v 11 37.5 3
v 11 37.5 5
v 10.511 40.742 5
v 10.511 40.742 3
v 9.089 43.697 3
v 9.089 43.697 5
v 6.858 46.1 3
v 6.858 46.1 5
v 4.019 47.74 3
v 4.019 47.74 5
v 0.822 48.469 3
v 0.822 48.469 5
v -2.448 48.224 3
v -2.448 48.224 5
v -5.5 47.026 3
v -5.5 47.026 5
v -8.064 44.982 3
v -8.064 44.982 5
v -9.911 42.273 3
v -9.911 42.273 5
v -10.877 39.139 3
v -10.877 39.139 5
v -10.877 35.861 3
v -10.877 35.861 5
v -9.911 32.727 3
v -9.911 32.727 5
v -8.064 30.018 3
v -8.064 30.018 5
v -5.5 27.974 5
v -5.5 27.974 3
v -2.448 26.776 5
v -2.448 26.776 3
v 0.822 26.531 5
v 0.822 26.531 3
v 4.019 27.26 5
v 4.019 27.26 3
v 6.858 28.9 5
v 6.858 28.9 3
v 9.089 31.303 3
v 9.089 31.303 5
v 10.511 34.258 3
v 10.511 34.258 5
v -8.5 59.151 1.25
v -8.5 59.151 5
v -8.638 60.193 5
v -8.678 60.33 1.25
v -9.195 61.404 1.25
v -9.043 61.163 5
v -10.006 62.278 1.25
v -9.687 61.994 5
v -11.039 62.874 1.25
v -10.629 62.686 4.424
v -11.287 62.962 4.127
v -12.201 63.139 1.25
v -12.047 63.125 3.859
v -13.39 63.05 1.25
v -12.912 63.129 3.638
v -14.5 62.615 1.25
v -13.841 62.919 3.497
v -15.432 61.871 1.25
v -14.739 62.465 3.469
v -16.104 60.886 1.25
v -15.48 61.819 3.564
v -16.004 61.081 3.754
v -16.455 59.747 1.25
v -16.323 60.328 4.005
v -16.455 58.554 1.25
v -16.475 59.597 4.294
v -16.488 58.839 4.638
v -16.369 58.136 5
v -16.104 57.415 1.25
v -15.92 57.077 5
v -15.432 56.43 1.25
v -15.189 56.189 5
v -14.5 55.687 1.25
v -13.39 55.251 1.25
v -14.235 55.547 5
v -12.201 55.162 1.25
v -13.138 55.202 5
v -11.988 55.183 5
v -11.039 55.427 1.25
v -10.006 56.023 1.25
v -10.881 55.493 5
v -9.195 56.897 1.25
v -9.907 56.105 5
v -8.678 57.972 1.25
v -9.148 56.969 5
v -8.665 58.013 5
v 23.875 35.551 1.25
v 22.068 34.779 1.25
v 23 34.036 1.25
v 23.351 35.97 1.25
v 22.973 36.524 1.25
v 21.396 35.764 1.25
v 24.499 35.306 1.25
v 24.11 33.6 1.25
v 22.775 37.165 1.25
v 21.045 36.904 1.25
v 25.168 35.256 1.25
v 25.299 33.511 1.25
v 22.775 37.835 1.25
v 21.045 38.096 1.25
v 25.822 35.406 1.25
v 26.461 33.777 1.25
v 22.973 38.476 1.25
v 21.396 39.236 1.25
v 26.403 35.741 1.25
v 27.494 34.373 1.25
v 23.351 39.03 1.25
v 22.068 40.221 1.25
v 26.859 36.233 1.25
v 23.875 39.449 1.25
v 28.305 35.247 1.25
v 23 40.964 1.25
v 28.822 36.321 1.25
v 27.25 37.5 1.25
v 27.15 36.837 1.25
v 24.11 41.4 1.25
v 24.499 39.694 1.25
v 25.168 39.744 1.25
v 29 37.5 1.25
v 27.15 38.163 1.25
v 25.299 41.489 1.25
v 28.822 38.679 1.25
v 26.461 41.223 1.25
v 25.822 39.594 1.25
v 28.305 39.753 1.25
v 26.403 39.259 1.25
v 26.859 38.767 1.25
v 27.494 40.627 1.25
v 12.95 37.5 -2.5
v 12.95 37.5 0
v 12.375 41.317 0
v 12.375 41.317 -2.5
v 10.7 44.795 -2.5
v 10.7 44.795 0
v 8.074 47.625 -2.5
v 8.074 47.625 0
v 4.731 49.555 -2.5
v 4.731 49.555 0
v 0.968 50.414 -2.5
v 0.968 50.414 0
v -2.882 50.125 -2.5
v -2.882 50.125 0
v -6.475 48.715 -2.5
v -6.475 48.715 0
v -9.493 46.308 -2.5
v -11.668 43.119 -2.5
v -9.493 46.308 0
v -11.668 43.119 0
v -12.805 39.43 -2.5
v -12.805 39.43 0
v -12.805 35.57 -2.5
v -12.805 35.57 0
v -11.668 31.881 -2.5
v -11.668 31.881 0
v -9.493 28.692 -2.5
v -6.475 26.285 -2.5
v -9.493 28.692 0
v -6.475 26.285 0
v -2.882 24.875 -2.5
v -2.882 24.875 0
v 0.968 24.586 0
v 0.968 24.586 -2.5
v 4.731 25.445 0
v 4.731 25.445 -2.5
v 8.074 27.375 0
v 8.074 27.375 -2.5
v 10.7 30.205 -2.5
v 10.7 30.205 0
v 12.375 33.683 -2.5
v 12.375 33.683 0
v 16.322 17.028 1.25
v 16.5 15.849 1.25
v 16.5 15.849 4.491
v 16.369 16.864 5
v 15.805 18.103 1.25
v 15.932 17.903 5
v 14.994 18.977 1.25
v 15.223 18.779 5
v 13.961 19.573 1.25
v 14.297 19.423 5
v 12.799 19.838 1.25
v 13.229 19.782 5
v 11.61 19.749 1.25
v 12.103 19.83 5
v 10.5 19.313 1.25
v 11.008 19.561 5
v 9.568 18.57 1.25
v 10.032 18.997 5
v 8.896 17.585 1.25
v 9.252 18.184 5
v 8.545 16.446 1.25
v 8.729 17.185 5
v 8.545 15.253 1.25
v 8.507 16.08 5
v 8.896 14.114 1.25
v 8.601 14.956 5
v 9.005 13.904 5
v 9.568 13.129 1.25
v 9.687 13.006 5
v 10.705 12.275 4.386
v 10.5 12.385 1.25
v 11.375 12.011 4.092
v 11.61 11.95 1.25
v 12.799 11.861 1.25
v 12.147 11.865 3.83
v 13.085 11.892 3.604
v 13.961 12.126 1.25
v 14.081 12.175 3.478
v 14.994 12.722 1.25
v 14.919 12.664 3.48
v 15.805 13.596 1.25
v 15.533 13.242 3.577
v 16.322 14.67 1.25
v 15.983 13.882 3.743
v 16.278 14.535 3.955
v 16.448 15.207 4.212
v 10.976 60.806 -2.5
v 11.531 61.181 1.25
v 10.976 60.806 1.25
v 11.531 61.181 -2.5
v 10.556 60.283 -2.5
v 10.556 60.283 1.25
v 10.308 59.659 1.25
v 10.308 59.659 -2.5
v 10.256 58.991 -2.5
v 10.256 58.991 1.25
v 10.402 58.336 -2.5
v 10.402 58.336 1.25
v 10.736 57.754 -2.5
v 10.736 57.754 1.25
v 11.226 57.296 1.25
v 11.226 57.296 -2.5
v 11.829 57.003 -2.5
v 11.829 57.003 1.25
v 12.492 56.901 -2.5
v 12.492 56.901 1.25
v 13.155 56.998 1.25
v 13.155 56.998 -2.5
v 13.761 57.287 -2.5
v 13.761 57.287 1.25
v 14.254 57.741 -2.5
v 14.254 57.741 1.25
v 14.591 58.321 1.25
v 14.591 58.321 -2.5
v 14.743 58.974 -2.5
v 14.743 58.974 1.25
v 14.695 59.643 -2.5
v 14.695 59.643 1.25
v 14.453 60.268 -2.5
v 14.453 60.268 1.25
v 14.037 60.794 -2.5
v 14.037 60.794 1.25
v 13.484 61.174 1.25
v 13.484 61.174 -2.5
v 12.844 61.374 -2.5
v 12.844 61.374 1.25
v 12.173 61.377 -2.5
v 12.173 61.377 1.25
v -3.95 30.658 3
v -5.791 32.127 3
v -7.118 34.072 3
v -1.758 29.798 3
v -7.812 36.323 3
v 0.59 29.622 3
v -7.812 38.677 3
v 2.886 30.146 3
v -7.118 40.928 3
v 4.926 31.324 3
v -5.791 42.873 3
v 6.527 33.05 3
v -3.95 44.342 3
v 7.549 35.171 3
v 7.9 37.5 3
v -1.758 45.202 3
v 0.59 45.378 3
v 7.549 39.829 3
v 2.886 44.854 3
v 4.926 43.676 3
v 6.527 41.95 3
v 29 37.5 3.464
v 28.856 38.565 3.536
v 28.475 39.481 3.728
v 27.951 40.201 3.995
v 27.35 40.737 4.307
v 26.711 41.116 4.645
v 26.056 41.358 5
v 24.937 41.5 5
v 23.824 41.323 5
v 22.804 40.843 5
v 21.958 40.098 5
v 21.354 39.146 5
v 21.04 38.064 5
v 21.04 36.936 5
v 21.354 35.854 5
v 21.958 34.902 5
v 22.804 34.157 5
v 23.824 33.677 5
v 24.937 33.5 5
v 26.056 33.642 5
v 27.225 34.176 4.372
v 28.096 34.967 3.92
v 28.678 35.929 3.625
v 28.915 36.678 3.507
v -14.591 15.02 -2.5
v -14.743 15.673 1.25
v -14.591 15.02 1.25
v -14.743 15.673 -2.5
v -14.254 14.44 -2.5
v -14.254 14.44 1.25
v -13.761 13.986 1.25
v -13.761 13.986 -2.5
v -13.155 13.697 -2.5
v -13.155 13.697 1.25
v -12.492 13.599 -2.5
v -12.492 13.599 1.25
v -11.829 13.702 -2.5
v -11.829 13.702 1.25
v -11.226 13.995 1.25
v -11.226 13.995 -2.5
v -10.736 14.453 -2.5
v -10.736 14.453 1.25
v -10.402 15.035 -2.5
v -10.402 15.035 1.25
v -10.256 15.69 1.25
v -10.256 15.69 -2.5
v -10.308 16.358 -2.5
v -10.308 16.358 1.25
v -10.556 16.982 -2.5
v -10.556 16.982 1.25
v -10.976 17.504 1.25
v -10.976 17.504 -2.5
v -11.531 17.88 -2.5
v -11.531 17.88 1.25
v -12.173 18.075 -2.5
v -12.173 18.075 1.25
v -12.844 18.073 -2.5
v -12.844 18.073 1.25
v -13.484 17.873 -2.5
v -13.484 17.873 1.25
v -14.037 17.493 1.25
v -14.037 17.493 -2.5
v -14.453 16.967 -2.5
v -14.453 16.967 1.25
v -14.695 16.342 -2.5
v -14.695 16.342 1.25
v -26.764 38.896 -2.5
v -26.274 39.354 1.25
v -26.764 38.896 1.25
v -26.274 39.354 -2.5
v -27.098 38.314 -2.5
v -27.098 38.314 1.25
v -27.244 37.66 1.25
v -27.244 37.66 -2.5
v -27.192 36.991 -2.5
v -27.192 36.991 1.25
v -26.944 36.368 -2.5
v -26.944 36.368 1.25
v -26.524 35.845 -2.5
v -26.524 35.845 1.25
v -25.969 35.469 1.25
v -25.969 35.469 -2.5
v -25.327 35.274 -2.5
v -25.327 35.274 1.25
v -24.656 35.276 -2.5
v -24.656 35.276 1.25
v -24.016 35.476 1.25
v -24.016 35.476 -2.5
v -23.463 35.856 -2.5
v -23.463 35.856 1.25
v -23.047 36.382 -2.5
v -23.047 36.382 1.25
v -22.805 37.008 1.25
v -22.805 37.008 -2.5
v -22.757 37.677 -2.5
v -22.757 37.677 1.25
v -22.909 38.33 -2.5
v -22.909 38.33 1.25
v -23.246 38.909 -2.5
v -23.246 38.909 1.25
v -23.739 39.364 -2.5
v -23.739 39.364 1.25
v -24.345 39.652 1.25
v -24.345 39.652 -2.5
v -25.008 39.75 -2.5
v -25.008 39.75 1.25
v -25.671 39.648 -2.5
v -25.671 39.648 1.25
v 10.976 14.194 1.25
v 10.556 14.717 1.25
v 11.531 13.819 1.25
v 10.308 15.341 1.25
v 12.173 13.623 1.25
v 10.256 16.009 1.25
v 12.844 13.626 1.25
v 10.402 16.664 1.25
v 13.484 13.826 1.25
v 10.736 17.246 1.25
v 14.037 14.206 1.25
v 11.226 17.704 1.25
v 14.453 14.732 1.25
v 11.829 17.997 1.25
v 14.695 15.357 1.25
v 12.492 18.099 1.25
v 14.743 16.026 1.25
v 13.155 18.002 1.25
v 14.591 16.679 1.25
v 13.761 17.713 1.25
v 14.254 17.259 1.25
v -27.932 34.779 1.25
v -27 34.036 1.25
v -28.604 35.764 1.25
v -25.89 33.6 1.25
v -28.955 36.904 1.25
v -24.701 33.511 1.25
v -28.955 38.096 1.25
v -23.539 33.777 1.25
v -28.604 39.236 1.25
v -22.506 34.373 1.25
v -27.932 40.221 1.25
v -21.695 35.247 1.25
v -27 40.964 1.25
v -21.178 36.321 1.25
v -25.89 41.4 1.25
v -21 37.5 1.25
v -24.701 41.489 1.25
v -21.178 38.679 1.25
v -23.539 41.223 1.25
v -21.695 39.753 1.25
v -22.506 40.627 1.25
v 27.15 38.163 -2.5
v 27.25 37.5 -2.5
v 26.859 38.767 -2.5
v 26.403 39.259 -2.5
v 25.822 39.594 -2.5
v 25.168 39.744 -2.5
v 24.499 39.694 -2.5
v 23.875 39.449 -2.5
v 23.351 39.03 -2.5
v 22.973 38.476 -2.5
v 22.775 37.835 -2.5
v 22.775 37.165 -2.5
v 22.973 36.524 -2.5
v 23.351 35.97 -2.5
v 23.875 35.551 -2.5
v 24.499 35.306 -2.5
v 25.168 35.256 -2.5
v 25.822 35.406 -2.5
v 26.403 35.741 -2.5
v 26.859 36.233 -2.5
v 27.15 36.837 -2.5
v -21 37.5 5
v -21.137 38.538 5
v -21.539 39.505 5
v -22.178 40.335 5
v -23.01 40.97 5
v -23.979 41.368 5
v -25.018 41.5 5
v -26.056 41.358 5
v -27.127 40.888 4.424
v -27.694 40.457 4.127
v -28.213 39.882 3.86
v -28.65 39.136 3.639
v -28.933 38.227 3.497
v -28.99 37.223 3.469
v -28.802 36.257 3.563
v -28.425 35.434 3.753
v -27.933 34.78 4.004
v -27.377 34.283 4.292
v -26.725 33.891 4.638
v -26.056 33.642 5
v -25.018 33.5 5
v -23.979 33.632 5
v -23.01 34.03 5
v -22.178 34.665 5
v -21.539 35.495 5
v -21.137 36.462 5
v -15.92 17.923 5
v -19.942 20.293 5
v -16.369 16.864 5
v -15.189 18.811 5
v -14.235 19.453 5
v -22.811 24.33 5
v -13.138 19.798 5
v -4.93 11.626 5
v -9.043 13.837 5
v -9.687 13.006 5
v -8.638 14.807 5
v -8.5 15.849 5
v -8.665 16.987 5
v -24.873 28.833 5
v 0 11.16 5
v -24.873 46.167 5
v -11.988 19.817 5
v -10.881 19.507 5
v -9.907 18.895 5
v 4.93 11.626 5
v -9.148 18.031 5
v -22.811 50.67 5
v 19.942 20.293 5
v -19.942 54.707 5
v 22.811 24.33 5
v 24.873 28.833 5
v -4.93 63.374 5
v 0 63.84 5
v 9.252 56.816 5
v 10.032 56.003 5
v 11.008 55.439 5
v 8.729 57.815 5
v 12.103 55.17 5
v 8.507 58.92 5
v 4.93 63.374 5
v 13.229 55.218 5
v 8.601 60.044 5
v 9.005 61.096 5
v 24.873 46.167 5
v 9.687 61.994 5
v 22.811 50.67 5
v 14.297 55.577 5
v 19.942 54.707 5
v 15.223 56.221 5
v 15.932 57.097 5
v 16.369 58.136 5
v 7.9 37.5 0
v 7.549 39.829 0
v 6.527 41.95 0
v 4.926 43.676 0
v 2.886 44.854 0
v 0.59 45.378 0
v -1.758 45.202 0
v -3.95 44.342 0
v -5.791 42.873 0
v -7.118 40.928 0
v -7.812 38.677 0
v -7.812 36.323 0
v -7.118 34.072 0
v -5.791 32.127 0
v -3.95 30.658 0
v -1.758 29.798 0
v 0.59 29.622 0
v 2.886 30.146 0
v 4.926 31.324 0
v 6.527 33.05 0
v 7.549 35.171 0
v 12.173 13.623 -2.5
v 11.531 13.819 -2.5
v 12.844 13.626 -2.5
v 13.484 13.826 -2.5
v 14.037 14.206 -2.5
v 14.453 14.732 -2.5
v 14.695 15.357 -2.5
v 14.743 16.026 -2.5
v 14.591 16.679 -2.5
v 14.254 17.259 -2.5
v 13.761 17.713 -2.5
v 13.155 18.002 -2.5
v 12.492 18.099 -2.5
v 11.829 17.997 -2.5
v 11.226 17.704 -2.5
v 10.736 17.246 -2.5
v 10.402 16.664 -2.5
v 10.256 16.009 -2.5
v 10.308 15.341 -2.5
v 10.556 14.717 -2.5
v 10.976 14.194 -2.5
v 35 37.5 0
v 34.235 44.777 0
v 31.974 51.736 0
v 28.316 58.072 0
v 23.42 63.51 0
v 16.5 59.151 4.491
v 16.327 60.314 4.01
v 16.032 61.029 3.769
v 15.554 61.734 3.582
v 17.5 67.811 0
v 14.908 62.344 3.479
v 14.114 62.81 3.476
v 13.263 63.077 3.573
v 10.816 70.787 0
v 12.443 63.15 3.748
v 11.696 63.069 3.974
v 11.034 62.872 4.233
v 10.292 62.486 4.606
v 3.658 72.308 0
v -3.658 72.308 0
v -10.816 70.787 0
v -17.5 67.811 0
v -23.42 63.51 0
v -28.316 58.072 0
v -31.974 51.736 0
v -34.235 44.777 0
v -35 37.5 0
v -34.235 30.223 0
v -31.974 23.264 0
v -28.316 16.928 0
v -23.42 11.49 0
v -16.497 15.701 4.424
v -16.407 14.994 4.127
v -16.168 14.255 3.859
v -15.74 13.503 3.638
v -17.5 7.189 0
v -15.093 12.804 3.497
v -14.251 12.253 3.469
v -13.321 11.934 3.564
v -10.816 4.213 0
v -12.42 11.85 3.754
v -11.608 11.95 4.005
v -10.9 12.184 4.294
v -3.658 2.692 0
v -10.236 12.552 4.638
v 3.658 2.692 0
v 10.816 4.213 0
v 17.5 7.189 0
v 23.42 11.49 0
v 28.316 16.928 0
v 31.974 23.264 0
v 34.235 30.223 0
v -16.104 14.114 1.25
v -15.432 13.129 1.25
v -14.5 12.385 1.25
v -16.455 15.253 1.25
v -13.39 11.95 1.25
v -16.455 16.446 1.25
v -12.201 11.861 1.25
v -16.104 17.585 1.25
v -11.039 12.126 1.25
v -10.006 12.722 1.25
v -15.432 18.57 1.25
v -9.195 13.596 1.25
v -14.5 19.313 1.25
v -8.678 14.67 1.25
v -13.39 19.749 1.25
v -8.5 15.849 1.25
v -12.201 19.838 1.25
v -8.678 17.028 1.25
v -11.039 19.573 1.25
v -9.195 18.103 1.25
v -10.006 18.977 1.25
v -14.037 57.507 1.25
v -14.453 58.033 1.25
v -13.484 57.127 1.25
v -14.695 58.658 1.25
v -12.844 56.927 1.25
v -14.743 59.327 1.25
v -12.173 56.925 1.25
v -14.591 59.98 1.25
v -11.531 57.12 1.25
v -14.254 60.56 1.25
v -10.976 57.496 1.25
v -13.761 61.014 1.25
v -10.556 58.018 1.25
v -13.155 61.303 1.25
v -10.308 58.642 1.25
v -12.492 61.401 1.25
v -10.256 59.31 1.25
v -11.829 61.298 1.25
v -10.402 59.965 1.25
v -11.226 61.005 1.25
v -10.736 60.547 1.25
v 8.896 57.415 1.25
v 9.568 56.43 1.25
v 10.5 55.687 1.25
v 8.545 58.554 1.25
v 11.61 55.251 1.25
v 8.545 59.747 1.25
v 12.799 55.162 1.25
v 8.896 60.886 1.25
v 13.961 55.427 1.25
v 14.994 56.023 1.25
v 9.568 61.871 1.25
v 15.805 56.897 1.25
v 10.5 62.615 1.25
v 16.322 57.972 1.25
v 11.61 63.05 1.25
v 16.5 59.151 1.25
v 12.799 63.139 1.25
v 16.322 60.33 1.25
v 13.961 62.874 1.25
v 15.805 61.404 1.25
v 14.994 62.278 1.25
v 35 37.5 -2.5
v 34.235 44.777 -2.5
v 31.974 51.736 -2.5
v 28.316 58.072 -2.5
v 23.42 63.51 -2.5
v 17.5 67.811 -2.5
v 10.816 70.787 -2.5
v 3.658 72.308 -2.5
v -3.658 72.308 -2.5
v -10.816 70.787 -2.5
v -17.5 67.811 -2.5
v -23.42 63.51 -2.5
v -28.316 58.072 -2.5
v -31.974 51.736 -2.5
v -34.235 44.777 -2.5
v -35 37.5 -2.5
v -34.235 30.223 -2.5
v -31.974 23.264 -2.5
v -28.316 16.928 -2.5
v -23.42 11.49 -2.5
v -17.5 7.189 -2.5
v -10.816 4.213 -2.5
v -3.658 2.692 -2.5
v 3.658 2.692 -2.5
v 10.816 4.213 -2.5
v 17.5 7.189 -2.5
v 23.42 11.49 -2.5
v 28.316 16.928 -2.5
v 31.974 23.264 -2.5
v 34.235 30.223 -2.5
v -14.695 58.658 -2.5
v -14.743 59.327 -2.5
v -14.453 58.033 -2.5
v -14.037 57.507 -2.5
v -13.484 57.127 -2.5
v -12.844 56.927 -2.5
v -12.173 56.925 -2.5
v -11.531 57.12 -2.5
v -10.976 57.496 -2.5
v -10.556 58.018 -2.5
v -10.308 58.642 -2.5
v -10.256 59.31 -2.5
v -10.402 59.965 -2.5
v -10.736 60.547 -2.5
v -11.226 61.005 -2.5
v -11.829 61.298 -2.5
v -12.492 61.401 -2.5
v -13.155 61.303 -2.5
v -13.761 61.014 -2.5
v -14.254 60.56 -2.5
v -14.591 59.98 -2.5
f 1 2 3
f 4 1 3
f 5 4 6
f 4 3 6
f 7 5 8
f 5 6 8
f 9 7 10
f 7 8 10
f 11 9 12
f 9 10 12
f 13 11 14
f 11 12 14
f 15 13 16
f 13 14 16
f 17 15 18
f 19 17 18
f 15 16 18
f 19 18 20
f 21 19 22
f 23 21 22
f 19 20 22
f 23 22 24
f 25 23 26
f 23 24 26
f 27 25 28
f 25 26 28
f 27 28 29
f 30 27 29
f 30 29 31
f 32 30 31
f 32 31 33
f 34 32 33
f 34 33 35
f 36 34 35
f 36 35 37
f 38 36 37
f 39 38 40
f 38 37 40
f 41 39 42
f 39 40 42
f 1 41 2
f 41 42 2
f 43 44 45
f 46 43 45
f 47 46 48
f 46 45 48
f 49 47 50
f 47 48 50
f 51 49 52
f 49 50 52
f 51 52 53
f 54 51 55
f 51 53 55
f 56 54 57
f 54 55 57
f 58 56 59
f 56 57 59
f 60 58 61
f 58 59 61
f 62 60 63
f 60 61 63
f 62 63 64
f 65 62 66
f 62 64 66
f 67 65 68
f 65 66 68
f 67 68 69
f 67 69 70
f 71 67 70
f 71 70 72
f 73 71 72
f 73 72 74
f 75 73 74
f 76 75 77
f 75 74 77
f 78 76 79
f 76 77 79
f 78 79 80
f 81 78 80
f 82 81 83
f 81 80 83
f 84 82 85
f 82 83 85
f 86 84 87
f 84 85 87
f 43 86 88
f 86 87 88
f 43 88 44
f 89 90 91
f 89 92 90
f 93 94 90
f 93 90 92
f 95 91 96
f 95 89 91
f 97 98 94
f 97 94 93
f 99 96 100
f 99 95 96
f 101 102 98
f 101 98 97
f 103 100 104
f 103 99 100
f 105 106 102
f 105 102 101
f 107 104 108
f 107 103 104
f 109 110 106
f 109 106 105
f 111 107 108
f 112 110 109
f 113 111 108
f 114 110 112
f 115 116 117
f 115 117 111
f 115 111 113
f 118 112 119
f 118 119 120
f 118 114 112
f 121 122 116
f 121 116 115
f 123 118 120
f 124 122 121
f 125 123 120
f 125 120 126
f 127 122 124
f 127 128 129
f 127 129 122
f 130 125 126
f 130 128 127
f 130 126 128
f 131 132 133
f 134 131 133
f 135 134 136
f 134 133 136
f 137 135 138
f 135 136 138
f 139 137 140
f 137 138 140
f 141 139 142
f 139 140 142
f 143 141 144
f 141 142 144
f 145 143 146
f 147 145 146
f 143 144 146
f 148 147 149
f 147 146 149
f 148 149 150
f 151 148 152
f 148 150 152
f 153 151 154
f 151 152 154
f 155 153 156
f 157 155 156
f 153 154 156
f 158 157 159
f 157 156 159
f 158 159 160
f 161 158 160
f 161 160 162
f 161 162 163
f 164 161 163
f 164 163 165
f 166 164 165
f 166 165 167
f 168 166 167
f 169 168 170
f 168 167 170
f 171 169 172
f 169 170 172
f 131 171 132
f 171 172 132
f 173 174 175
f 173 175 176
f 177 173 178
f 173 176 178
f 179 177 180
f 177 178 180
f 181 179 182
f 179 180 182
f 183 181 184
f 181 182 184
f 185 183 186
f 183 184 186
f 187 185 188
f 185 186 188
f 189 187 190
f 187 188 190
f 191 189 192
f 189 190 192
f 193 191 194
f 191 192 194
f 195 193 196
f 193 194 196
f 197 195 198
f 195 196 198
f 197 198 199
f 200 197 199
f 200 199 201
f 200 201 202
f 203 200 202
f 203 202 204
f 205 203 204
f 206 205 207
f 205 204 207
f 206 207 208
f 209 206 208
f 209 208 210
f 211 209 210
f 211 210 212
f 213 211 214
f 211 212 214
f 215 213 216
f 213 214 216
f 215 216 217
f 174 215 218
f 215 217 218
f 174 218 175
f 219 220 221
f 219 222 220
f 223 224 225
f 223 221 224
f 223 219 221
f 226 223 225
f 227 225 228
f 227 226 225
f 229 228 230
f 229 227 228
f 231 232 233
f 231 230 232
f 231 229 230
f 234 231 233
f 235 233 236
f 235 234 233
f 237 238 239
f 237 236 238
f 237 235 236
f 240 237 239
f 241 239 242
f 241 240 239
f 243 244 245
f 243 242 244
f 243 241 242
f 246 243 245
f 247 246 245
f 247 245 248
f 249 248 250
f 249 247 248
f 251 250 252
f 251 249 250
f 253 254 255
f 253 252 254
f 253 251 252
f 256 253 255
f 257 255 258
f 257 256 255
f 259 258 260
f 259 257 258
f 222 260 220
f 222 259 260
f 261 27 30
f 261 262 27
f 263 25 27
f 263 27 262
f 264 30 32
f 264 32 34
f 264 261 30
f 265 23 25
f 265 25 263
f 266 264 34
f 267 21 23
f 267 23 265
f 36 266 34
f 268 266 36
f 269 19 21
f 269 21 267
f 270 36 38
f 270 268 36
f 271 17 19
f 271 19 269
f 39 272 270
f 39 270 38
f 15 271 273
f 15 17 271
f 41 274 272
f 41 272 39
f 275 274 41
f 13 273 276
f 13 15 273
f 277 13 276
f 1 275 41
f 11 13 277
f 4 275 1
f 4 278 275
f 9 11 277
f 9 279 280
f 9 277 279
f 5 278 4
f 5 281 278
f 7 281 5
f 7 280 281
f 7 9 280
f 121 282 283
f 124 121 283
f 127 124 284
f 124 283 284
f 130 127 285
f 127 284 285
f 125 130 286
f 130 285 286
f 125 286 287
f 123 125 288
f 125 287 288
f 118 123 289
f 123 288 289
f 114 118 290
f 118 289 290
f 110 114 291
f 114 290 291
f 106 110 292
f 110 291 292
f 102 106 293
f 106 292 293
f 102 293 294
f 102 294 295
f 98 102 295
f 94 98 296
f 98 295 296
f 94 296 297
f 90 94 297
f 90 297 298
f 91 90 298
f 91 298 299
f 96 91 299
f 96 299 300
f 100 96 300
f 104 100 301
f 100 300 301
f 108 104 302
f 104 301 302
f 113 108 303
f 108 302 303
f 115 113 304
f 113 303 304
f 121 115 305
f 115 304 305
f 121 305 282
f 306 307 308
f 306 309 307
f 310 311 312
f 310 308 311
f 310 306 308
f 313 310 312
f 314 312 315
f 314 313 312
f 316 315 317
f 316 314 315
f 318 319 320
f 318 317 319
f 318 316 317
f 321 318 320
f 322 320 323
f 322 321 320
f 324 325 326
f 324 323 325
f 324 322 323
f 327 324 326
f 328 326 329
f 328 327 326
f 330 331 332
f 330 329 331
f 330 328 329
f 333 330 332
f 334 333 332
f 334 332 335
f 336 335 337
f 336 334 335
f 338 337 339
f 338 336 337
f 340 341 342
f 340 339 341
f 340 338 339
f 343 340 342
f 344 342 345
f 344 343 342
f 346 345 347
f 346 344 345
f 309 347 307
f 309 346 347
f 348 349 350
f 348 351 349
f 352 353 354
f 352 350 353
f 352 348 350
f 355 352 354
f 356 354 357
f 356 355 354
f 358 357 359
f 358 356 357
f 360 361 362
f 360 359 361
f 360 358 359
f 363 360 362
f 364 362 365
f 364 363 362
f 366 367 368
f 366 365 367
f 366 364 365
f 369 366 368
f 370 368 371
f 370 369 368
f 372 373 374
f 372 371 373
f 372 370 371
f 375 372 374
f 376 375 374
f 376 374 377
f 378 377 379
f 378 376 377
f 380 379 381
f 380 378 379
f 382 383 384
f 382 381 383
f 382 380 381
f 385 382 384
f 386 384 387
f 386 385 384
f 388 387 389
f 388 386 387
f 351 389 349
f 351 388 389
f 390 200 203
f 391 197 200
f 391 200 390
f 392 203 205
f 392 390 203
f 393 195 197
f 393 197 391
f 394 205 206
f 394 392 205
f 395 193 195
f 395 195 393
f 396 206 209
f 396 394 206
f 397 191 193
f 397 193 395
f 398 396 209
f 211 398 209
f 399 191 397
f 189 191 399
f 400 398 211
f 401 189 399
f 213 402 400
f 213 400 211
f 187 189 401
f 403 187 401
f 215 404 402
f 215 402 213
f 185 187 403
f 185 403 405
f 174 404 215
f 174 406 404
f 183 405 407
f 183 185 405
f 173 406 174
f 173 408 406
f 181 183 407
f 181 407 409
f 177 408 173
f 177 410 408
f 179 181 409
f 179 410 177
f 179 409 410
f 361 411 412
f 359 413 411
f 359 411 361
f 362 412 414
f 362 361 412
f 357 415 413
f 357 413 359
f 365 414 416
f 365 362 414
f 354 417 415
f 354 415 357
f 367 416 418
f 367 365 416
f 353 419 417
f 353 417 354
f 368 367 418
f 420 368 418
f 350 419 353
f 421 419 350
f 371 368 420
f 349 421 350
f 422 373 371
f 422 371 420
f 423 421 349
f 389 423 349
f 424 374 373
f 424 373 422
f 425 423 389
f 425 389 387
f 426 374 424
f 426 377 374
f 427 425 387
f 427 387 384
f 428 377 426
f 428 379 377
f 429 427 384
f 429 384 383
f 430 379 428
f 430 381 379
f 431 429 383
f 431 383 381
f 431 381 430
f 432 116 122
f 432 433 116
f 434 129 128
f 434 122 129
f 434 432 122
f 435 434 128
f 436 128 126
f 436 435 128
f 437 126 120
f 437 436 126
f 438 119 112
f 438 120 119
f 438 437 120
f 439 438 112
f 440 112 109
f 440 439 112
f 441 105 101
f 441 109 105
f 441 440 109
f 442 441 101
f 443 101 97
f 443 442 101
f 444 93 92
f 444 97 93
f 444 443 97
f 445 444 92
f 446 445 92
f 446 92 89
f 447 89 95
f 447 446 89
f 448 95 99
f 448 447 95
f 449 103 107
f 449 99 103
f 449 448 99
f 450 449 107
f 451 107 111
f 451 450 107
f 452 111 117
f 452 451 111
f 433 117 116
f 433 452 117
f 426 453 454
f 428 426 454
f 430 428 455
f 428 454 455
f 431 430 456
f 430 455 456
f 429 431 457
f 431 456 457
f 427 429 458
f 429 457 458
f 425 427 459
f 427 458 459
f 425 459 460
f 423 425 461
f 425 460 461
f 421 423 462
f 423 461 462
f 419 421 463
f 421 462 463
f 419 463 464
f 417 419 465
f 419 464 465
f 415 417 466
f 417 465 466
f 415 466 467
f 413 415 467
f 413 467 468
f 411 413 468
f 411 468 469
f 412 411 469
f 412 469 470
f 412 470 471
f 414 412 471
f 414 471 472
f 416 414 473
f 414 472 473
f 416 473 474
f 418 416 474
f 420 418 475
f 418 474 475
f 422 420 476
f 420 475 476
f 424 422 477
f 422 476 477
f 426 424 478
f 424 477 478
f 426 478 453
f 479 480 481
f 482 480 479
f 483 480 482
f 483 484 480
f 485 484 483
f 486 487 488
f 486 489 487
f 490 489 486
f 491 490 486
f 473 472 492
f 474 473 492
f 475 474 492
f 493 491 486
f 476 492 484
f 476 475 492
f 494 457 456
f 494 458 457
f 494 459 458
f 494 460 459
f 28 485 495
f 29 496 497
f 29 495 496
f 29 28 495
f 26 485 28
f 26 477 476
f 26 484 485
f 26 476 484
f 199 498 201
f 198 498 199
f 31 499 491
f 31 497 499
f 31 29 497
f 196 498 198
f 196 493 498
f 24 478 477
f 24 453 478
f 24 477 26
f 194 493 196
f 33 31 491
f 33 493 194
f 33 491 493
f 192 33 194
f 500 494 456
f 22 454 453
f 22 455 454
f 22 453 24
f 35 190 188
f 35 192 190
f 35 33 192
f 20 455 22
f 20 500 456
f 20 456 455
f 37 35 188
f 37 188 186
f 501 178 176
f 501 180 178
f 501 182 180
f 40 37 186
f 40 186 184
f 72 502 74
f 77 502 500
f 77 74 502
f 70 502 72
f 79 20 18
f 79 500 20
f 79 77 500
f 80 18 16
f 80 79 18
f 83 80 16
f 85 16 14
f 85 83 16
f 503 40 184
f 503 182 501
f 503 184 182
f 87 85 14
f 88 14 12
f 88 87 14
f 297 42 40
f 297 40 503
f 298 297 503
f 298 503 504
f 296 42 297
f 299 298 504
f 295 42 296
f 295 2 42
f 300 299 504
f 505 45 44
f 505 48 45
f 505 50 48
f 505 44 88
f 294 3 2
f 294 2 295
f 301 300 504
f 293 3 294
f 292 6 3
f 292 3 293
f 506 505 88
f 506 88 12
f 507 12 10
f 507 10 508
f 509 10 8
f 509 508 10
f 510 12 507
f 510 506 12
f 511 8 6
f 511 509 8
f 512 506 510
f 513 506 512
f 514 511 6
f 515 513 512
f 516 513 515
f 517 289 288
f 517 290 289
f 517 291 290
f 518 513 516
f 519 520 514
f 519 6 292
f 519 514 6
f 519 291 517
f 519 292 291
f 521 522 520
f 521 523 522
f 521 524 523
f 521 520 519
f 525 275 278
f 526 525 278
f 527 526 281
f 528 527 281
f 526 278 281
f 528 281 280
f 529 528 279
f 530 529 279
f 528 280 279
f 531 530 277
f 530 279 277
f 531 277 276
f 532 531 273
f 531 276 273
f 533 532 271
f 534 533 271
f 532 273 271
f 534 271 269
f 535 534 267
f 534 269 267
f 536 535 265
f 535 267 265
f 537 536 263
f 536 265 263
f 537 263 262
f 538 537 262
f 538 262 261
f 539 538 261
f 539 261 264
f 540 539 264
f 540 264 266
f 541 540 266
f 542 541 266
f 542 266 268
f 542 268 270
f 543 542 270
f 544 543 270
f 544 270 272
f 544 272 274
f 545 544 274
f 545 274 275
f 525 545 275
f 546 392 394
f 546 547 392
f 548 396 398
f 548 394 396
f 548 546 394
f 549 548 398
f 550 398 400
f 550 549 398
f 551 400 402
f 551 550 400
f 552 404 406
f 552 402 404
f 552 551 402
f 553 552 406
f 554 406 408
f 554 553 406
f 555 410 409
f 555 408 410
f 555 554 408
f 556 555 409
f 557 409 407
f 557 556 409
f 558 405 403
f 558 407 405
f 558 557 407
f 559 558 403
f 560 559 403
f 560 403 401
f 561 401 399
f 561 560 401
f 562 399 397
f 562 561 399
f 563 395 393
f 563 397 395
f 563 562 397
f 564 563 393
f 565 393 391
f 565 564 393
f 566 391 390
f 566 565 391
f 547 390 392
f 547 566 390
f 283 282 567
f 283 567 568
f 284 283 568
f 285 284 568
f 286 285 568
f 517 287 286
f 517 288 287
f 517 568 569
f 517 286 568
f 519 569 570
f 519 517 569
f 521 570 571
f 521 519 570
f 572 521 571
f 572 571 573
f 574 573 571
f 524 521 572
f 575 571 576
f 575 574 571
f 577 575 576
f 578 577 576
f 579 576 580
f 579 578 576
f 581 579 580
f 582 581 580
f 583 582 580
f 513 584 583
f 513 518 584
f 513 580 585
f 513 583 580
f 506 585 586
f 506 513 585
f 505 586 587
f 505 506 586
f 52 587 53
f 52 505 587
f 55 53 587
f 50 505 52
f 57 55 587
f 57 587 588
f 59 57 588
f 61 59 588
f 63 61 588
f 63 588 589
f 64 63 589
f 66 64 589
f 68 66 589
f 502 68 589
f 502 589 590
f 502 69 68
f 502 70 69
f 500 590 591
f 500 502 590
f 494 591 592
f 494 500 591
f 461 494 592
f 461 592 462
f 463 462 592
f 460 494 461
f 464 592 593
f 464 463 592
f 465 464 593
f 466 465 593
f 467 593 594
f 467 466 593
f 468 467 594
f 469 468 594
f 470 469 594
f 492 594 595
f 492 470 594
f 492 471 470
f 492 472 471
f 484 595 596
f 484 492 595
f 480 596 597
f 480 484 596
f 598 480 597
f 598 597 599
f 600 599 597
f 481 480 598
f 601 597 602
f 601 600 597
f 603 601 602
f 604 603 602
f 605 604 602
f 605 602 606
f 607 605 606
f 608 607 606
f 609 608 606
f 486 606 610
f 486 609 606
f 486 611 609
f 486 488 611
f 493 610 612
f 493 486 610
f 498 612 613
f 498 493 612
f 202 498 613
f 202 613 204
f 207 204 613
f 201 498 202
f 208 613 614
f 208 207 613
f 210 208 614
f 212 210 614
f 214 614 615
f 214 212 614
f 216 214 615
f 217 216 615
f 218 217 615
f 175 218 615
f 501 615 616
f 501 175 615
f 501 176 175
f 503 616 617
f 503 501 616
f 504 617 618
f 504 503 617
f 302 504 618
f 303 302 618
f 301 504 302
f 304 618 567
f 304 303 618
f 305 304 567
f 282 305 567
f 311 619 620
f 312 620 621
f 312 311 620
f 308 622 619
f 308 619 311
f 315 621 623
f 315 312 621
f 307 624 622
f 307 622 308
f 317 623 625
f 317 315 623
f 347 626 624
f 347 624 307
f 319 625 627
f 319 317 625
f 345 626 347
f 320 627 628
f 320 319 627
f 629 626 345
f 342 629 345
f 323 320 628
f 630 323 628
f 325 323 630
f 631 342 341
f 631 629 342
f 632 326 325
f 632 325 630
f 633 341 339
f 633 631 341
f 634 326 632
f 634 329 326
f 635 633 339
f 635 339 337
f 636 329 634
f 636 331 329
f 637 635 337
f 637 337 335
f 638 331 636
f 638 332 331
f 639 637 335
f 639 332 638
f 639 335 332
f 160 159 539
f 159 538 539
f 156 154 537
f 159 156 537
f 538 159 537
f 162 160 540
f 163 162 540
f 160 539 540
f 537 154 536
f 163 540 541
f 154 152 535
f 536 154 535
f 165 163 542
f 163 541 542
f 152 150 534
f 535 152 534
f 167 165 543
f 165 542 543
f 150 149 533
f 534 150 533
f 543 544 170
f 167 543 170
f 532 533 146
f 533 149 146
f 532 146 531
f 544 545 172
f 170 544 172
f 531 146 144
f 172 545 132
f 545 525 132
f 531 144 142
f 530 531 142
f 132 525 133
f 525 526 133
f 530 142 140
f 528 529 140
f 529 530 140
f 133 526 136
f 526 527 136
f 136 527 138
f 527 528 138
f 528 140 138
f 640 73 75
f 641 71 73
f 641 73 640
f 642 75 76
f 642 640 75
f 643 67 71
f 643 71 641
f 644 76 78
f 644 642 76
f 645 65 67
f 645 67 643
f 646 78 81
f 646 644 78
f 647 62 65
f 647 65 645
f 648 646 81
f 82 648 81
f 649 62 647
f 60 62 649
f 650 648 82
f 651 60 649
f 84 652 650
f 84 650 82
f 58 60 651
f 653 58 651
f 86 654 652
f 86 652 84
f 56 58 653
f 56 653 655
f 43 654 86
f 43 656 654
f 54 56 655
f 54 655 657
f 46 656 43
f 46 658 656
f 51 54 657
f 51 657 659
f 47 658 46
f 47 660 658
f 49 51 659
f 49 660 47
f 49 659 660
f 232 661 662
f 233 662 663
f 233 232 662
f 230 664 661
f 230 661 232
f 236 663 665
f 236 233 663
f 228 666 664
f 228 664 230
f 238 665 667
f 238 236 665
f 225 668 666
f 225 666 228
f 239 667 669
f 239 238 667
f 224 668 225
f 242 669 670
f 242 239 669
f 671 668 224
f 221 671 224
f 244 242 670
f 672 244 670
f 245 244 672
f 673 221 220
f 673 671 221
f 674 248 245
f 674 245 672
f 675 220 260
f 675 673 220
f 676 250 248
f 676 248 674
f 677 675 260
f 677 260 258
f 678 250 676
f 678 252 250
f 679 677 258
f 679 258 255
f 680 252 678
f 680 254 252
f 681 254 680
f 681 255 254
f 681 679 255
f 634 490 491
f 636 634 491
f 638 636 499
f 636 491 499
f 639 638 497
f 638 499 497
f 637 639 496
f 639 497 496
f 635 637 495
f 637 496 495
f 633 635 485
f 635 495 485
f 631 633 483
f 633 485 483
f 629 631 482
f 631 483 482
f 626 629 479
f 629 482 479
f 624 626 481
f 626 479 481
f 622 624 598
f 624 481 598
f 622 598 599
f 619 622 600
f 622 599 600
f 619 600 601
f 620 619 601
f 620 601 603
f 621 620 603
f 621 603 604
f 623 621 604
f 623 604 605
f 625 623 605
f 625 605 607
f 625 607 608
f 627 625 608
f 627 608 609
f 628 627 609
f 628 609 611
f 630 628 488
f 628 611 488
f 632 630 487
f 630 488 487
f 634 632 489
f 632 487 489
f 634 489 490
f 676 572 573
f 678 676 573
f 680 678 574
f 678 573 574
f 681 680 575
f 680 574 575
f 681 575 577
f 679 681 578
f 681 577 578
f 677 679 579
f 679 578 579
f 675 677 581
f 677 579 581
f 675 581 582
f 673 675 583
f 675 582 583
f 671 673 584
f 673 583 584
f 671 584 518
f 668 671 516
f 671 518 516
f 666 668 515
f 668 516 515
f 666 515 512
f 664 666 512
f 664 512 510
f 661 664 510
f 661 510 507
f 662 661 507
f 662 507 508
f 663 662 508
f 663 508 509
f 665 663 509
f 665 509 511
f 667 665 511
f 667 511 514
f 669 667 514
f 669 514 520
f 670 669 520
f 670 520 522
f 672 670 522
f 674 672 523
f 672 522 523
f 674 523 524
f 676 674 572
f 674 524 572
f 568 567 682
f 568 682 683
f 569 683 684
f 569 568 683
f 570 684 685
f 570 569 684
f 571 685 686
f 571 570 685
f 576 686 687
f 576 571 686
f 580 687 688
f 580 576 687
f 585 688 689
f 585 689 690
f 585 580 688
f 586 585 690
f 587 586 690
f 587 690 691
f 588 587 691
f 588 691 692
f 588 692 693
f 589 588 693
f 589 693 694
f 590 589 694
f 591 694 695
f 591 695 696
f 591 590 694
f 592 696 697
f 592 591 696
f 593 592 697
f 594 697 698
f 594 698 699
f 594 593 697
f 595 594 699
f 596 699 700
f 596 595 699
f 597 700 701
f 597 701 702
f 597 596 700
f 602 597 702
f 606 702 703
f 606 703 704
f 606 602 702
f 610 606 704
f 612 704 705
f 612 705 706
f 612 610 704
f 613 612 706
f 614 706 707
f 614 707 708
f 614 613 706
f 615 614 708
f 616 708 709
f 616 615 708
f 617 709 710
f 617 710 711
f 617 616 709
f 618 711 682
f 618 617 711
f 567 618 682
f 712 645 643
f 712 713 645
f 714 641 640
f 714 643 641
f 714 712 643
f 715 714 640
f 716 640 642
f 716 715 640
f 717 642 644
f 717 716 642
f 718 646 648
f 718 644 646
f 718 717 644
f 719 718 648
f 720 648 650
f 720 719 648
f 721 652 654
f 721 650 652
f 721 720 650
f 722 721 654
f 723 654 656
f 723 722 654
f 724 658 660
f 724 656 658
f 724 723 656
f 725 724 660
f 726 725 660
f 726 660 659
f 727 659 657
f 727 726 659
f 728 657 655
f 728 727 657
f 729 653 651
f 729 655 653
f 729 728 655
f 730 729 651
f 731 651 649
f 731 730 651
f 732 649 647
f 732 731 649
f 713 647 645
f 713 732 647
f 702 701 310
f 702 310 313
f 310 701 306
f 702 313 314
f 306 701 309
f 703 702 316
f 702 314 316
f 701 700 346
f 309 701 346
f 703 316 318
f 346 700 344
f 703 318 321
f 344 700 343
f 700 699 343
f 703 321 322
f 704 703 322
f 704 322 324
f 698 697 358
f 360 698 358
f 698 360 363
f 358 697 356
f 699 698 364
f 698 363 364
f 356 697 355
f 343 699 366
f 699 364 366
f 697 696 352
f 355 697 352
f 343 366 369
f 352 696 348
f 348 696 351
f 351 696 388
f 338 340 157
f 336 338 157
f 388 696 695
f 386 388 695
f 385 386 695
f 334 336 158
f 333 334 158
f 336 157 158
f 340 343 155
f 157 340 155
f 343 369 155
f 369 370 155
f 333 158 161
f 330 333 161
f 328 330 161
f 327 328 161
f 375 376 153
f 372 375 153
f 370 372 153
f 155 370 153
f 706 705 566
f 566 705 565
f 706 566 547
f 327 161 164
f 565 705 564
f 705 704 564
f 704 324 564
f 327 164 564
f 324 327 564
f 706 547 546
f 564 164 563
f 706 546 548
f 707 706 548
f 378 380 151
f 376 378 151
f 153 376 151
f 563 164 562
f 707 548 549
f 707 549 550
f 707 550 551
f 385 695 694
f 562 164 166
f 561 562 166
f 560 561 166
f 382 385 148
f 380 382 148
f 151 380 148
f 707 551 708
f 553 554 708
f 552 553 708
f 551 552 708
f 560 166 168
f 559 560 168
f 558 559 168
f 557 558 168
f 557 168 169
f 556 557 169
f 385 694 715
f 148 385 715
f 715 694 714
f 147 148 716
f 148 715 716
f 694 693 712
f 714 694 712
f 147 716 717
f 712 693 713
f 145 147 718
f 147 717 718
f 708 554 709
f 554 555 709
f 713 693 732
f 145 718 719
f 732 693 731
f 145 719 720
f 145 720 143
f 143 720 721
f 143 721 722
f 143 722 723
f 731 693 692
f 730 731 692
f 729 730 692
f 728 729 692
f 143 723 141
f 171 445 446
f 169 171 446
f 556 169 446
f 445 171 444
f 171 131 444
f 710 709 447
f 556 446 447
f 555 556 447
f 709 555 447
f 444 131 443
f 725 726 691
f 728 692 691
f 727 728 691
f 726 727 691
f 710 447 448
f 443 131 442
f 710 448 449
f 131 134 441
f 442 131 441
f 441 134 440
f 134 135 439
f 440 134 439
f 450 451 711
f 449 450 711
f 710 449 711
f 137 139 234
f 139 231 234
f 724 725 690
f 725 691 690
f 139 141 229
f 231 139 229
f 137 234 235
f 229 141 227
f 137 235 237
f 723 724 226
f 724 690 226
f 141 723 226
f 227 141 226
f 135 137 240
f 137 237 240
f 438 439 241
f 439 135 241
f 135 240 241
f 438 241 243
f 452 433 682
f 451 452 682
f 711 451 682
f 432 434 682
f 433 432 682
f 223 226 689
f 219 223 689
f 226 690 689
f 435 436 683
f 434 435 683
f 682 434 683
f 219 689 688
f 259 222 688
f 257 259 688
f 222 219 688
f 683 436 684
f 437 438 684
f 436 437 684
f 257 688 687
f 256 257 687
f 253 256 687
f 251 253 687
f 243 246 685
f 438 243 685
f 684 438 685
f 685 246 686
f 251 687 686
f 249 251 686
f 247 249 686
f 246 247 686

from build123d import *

# Parameters (mm, degrees)
SKETCH1_R               = 35
BOSS_EXTRUDE1_DEPTH     = 5
BOSS_EXTRUDE1_TAPER     = 60
SKETCH3_R               = 11
CUT_EXTRUDE1_DEPTH      = 2
SKETCH4_R               = 7.9
CUT_EXTRUDE2_DEPTH      = 81.661329025
SKETCH7_R               = 35
SKETCH7_R_2             = 12.95
BOSS_EXTRUDE2_DEPTH     = 2.5
CUT_EXTRUDE6_DEPTH      = 81.661329025
CUT_EXTRUDE6_DEPTH_BACK = 81.661329025
SKETCH5_R               = 2.25
SKETCH8_R               = 4
CUT_EXTRUDE8_DEPTH      = 3.75


with BuildPart() as part:
    # Sketch1 → Boss-Extrude1 (new body)
    with BuildSketch(Plane.XY):
        with Locations((0, 37.5)):
            Circle(SKETCH1_R)
    extrude(amount=BOSS_EXTRUDE1_DEPTH, taper=BOSS_EXTRUDE1_TAPER)

    # Sketch3 → Cut-Extrude1 (cut)
    with BuildSketch(Plane.XY.offset(5)):
        with Locations((0, 37.5)):
            Circle(SKETCH3_R)
    extrude(amount=-CUT_EXTRUDE1_DEPTH, mode=Mode.SUBTRACT)

    # Sketch4 → Cut-Extrude2 (cut, through all)
    with BuildSketch(Plane.XY.offset(5)):
        with Locations((0, 37.5)):
            Circle(SKETCH4_R)
    extrude(amount=-CUT_EXTRUDE2_DEPTH, mode=Mode.SUBTRACT)

    # Sketch7 → Boss-Extrude2 (add)
    with BuildSketch(Plane.XY):
        with Locations((0, 37.5)):
            Circle(SKETCH7_R)
        with Locations((0, 37.5)):
            Circle(SKETCH7_R_2, mode=Mode.SUBTRACT)
    extrude(amount=-BOSS_EXTRUDE2_DEPTH)

    # Sketch5 → Cut-Extrude6 (cut, two sides: drawn at the far end of the back side and taken through both)
    with BuildSketch(Plane.XY.offset(-CUT_EXTRUDE6_DEPTH_BACK)):
        with Locations(Location((-12.5, 15.849364905, 0), (0, 0, 184.499391781))):
            Circle(SKETCH5_R)
        with Locations(Location((-25, 37.5, 0), (0, 0, 124.499391764))):
            Circle(SKETCH5_R)
        with Locations(Location((-12.5, 59.150635095, 0), (0, 0, 175.50060828))):
            Circle(SKETCH5_R)
        with Locations(Location((12.5, 59.150635095, 0), (0, 0, 115.50060828))):
            Circle(SKETCH5_R)
        with Locations((25, 37.5)):
            Circle(SKETCH5_R)
        with Locations(Location((12.5, 15.849364905, 0), (0, 0, 244.499391764))):
            Circle(SKETCH5_R)
    extrude(amount=CUT_EXTRUDE6_DEPTH + CUT_EXTRUDE6_DEPTH_BACK, mode=Mode.SUBTRACT)

    # Sketch8 → Cut-Extrude8 (cut)
    with BuildSketch(Plane.XY.offset(5)):
        with Locations((-12.5, 59.150635095)):
            Circle(SKETCH8_R)
        with Locations((-25, 37.5)):
            Circle(SKETCH8_R)
        with Locations((12.5, 59.150635095)):
            Circle(SKETCH8_R)
        with Locations((25, 37.5)):
            Circle(SKETCH8_R)
        with Locations((12.5, 15.849364905)):
            Circle(SKETCH8_R)
        with Locations((-12.5, 15.849364905)):
            Circle(SKETCH8_R)
    extrude(amount=-CUT_EXTRUDE8_DEPTH, mode=Mode.SUBTRACT)


solid = part.part
